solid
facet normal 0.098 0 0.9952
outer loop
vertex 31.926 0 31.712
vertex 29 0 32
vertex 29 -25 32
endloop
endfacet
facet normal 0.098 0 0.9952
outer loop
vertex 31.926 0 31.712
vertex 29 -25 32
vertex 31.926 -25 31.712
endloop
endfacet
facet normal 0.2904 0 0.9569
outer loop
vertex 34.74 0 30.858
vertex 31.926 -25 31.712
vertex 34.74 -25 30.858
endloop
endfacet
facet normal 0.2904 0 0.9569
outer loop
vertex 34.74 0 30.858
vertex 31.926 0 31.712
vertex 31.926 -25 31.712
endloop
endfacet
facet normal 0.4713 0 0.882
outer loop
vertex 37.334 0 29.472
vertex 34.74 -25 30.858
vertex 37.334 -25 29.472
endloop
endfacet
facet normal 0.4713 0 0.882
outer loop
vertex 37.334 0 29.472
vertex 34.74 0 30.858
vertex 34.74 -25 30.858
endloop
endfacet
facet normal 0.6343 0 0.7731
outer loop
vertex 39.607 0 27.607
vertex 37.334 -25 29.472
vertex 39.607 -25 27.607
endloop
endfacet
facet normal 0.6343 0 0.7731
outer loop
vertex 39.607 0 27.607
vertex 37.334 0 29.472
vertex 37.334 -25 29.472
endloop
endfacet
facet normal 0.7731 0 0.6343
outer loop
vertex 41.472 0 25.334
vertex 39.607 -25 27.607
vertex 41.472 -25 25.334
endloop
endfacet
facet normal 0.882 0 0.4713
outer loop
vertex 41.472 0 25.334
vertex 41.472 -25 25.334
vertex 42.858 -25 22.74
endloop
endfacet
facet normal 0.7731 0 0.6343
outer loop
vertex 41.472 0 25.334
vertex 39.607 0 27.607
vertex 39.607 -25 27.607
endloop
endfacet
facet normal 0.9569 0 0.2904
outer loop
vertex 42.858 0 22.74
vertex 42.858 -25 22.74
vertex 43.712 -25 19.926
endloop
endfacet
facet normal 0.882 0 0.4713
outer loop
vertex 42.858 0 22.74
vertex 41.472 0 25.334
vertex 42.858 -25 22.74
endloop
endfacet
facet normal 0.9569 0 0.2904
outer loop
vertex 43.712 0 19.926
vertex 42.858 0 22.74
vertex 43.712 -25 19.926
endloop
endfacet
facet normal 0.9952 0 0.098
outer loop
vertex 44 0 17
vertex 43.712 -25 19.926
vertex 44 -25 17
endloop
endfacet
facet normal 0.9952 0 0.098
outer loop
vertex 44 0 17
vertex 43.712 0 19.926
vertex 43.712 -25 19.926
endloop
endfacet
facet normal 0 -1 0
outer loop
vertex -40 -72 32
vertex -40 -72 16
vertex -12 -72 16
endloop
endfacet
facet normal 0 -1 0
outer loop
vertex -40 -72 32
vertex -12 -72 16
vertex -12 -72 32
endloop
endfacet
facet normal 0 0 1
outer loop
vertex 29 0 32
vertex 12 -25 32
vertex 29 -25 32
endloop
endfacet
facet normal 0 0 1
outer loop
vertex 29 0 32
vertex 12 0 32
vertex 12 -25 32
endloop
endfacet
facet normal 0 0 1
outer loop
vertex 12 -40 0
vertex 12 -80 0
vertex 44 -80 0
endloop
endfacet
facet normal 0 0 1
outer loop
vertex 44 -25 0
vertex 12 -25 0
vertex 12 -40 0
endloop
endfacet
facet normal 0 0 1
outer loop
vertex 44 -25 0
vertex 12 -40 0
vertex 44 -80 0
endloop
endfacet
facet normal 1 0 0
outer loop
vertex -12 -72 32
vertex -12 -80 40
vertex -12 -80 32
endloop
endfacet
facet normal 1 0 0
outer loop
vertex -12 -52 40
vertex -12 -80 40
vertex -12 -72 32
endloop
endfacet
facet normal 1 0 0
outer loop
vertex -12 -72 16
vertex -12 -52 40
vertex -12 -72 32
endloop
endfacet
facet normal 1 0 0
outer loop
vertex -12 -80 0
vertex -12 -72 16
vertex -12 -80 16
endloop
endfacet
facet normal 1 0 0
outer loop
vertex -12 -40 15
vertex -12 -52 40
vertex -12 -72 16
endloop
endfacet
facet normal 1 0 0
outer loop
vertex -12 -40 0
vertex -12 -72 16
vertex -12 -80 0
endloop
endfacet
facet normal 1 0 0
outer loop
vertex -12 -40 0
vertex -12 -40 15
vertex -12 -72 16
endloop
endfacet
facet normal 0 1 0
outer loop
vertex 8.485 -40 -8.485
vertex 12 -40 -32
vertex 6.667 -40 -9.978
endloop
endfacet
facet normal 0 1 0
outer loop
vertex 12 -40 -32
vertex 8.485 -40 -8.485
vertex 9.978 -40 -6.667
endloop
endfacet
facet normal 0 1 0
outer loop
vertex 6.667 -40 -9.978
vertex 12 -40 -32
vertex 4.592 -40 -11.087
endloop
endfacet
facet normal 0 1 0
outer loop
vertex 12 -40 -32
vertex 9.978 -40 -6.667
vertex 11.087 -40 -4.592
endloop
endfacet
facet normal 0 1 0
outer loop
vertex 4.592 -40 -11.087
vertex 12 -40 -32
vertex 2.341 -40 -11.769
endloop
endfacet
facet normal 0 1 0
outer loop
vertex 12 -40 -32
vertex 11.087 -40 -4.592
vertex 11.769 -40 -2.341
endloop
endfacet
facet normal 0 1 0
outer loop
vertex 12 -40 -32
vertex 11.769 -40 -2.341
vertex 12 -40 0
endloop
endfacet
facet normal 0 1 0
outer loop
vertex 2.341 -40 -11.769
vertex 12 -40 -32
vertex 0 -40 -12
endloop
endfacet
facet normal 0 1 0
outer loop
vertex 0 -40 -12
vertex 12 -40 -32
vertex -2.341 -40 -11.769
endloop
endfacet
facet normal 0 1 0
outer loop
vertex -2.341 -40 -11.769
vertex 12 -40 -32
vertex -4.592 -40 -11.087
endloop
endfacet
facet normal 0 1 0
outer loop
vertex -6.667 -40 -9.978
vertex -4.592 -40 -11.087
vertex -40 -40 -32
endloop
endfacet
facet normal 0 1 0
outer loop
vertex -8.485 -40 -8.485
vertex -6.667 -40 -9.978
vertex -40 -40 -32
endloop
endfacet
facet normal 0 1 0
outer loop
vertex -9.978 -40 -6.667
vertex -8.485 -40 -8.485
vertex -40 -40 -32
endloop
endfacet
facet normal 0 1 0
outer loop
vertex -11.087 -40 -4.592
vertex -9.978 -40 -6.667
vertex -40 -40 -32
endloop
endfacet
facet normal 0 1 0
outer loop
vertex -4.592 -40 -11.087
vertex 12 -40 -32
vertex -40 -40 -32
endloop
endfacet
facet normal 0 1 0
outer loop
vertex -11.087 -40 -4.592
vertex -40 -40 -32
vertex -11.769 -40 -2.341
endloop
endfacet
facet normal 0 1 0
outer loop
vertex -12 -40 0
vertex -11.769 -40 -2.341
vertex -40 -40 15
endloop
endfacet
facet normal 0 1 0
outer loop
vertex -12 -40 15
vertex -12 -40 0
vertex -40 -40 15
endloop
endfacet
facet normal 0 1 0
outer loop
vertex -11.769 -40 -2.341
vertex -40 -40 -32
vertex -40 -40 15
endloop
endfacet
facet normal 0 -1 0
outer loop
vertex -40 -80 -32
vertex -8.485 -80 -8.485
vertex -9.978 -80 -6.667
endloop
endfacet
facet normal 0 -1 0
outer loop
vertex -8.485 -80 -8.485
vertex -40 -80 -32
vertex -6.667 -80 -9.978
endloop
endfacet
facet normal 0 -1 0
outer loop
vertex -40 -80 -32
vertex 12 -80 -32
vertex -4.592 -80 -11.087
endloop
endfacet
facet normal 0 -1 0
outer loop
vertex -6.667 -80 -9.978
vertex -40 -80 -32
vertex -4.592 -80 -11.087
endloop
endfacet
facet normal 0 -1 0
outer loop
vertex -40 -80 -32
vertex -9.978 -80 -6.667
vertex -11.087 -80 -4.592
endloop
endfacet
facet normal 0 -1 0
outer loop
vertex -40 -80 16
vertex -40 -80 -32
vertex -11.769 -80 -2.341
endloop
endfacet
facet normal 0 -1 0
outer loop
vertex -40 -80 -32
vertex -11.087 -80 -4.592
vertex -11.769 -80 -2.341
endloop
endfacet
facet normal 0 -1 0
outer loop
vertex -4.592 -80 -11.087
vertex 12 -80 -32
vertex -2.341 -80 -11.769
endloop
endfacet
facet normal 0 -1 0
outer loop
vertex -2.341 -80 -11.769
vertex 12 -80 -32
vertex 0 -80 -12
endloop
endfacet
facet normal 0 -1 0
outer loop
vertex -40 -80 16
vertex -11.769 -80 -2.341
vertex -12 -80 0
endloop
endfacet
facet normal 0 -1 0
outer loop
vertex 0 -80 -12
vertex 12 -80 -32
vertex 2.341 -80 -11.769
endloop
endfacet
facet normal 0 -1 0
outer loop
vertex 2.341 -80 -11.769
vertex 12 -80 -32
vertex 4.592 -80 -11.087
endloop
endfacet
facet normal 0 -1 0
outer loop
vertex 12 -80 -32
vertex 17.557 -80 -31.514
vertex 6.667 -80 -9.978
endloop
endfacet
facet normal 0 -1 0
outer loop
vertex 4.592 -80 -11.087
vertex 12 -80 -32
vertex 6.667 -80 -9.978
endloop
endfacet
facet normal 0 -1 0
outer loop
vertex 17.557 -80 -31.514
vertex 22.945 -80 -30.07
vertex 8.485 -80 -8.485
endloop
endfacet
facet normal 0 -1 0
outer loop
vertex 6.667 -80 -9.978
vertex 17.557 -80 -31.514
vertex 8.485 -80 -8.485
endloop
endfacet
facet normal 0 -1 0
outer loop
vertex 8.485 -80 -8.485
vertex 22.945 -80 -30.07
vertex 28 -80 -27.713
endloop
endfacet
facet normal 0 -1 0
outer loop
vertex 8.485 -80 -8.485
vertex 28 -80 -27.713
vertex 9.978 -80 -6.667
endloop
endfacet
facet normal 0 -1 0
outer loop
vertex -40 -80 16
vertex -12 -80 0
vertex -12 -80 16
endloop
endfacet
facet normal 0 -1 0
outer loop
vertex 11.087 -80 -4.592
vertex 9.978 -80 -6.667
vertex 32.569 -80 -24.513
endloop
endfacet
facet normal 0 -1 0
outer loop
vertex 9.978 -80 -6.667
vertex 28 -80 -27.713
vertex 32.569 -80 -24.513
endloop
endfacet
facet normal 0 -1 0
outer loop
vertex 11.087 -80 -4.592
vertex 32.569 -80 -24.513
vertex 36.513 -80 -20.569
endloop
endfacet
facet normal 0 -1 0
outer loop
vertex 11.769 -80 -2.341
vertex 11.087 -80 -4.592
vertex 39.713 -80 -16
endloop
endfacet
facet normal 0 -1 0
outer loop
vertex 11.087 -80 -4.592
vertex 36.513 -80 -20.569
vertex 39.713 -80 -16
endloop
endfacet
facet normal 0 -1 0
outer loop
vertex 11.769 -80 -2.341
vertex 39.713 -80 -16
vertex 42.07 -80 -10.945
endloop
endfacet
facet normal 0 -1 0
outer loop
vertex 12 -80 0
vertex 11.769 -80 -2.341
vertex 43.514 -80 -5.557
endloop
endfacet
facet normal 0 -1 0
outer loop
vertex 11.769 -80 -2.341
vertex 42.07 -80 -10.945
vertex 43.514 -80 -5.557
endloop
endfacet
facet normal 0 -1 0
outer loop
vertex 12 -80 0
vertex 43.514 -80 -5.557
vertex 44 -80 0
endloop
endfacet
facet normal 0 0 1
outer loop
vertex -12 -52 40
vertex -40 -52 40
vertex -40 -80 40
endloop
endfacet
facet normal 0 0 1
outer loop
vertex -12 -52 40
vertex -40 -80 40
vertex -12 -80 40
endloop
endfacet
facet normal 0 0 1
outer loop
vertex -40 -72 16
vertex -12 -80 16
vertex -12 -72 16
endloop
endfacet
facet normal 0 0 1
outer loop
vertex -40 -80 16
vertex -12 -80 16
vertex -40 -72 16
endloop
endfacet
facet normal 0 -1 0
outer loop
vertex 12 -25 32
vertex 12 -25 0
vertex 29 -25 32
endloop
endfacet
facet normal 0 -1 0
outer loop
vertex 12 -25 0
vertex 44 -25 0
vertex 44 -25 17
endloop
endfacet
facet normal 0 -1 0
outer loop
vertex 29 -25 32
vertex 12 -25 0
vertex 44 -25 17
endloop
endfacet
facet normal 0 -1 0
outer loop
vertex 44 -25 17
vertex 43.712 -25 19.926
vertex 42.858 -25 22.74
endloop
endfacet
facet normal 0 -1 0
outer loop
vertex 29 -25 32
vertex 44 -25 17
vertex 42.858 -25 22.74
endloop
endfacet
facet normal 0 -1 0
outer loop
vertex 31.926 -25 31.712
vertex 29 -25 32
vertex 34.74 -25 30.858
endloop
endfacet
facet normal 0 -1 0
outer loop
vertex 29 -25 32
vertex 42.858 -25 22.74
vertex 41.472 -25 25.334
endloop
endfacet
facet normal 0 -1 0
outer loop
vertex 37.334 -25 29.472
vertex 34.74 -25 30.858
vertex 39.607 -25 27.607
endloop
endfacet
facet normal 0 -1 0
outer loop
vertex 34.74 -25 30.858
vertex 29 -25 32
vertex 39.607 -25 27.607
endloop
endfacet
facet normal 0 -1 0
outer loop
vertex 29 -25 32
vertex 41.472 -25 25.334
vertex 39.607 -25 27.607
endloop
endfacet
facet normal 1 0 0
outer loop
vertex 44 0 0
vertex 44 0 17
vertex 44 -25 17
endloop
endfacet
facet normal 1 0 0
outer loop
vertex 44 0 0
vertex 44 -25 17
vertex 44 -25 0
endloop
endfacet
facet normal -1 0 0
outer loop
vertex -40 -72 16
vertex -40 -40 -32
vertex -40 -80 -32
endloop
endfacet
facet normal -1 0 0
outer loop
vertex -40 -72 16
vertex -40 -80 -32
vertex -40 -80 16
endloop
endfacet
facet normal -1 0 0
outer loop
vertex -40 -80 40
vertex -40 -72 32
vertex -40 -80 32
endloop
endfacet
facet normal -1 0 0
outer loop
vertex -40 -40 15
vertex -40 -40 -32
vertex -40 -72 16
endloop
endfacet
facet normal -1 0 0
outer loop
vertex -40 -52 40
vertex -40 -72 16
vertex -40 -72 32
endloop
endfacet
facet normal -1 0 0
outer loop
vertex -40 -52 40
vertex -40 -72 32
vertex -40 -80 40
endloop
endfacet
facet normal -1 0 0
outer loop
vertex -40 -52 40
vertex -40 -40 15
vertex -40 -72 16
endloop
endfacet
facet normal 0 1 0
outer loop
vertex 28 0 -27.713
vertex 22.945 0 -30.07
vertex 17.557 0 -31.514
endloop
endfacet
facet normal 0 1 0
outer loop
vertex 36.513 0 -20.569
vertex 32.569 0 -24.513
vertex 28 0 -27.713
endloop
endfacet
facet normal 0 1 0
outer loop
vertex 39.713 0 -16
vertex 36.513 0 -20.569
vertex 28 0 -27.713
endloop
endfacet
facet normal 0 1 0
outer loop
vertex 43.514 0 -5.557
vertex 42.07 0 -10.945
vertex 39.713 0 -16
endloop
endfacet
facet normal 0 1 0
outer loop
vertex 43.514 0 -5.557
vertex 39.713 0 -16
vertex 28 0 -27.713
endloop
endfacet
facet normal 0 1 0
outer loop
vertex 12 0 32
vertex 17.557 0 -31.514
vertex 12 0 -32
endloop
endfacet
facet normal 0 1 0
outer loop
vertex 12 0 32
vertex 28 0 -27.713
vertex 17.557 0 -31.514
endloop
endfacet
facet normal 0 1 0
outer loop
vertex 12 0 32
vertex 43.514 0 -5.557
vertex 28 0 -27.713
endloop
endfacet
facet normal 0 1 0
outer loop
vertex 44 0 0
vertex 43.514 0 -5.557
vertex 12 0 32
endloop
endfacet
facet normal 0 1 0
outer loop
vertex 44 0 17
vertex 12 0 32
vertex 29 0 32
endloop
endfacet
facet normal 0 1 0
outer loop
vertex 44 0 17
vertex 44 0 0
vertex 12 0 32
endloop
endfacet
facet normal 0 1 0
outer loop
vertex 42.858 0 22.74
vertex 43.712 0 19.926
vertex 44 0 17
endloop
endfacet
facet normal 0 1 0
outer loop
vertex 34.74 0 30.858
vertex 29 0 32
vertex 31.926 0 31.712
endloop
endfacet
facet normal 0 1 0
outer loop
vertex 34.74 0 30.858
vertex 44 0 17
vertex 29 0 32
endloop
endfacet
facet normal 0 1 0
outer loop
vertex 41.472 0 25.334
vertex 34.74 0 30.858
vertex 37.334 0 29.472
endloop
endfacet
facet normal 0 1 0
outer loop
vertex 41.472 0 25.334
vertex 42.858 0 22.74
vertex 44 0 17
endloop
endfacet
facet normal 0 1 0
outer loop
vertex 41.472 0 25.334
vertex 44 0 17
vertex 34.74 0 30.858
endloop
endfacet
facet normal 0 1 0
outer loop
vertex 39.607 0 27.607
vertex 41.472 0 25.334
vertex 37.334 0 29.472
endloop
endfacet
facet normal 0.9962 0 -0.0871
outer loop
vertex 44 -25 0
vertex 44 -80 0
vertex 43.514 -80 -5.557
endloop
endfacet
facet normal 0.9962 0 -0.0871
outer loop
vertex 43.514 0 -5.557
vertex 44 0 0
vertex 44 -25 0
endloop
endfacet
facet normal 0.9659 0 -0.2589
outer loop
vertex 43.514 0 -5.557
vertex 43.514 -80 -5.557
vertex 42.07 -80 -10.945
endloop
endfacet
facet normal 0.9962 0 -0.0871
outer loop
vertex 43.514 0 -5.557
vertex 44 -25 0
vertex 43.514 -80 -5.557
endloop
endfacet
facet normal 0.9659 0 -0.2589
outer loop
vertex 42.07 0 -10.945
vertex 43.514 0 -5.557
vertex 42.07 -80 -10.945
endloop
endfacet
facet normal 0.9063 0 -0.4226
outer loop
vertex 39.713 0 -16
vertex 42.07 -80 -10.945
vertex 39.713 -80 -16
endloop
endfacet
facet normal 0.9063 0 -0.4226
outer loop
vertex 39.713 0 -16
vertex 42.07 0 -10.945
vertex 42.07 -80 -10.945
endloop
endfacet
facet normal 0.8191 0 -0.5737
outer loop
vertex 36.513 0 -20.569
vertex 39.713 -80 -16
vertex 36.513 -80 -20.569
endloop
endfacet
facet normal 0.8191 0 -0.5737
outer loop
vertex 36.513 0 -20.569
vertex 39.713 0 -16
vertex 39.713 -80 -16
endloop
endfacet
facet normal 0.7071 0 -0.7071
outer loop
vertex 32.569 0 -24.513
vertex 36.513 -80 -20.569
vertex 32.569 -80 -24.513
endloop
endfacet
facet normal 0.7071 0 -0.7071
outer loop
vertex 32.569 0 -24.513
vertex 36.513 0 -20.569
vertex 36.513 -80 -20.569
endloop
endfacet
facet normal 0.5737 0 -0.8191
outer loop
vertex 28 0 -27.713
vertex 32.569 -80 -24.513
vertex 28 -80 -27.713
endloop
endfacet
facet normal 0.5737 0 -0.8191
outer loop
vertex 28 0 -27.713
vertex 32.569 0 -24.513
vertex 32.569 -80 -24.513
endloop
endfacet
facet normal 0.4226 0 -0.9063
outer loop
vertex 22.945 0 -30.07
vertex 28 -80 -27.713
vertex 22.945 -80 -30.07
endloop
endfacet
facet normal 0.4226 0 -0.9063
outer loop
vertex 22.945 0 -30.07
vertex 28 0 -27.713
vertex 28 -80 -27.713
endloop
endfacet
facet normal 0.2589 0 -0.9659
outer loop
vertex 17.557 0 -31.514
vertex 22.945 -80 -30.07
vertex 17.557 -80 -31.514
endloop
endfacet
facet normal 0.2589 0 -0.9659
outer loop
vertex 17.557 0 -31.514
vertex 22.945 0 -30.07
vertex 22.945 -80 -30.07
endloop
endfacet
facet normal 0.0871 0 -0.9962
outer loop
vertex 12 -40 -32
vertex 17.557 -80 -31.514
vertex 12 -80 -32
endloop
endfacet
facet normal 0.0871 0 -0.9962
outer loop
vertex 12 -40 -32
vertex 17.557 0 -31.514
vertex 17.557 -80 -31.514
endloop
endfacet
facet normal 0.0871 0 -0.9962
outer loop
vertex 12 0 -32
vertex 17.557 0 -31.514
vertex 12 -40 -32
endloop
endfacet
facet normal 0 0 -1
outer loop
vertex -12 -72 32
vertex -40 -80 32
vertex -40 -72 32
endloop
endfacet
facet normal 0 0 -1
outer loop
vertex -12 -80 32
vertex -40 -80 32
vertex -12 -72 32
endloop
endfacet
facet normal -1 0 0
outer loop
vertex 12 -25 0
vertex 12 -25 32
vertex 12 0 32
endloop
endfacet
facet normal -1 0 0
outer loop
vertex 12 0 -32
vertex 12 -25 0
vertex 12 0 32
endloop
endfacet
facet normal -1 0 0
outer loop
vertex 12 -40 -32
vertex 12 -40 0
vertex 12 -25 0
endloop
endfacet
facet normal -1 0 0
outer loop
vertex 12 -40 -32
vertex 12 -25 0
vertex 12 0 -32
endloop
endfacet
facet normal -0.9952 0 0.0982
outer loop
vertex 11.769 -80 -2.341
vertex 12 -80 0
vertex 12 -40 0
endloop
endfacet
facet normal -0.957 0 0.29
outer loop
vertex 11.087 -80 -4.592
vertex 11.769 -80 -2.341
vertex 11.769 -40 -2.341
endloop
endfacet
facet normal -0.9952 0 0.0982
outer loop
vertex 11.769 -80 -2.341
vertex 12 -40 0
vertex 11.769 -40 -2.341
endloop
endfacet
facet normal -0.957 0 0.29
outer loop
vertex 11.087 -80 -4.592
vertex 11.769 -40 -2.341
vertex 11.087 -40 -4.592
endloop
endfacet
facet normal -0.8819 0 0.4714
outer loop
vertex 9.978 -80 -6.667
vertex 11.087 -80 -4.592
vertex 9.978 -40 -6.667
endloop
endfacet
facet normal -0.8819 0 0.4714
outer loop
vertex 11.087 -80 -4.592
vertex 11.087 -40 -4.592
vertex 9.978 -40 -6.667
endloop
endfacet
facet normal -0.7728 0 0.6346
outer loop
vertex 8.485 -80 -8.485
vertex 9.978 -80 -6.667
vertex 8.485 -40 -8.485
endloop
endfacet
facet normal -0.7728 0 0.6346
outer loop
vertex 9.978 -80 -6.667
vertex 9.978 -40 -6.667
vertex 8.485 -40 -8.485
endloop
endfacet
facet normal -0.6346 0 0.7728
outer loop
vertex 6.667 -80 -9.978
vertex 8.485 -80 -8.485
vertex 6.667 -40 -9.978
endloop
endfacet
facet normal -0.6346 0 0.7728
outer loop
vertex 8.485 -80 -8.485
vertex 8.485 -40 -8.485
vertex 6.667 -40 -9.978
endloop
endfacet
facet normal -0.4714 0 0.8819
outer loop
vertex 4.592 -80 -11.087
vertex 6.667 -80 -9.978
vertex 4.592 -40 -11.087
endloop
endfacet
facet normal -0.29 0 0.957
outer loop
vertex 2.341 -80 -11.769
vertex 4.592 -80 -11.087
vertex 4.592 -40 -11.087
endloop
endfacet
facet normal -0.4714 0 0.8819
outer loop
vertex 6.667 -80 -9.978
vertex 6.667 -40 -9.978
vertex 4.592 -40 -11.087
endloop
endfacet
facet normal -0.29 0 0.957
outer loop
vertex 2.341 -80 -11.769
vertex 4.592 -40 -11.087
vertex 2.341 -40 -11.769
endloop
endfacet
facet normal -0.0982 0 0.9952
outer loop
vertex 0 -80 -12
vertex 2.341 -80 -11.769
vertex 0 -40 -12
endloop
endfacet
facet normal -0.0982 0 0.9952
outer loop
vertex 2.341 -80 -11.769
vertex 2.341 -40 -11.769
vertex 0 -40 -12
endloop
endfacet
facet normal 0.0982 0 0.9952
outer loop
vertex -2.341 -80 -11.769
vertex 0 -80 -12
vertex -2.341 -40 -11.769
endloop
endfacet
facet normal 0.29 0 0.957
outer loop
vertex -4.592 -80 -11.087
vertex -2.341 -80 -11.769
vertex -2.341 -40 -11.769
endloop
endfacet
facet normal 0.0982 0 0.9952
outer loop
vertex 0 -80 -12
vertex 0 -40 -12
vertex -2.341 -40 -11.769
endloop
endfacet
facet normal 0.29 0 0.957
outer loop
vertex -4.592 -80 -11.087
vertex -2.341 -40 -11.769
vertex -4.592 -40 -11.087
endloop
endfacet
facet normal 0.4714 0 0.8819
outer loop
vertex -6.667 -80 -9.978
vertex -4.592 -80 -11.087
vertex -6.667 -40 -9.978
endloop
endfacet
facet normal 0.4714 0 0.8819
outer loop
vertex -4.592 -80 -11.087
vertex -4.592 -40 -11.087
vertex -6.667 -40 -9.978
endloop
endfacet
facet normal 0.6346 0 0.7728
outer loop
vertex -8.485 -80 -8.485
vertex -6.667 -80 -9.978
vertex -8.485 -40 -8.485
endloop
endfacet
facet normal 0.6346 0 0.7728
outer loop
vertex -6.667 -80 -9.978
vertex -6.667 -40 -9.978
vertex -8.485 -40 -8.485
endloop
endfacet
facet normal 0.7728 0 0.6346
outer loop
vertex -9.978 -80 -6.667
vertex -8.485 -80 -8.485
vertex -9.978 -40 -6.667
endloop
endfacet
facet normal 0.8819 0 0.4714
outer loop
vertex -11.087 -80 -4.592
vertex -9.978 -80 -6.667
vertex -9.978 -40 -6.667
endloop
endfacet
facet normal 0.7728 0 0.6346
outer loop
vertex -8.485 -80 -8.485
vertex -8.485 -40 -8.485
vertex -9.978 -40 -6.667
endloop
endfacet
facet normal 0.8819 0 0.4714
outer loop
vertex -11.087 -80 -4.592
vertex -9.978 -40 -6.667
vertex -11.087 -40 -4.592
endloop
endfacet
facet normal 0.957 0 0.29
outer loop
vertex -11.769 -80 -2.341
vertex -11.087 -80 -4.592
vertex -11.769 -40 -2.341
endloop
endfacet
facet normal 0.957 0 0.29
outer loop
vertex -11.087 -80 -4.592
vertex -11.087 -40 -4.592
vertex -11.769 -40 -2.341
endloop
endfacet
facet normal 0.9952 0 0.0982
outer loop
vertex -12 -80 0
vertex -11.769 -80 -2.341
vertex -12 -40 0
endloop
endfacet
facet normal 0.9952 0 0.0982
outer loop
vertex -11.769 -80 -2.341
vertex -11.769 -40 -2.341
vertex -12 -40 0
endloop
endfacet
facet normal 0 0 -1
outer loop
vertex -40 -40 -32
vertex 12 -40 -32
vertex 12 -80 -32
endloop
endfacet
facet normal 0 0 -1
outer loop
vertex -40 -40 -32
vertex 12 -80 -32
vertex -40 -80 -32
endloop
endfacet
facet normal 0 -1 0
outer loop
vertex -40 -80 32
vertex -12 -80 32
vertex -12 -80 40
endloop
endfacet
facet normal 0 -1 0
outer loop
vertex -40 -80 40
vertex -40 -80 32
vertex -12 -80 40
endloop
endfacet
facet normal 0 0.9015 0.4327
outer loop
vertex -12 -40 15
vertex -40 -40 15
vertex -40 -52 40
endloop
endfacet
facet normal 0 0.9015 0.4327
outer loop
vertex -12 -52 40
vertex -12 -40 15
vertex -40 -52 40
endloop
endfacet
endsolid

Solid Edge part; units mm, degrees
sketch "Sketch1" plane through (0, 0, 0) normal (0, -1, 0) x (1, 0, 0)
  line L0 (44, 17) -> (44, 0)
  line L1 (12, 0) -> (44, 0)
  line L2 (12, 0) -> (12, 32)
  line L3 (12, 32) -> (29, 32)
  arc A0 (29, 32) -> (44, 17) centre (29, 17) cw
extrude "Protrusion1" add sketch "Sketch1" along normal blind 25
sketch "Sketch2" plane through (0, 0, 0) normal (0, -1, 0) x (1, 0, 0)
  arc A0 (44, 0) -> (12, -32) centre (12, 0) cw
  line L0 (12, -32) -> (-40, -32)
  line L1 (-40, -32) -> (-40, 40)
  line L2 (-40, 40) -> (-12, 40)
  line L3 (-12, 40) -> (-12, 0)
  arc A1 (12, 0) -> (-12, 0) centre (0, 0) cw
  line L4 (12, 0) -> (44, 0)
extrude "ExtrudedProtrusion_2" add sketch "Sketch2" along normal blind 80
sketch "Sketch3" plane through (2, -80, 4) normal (0, -1, 0) x (1, 0, 0)
  line L0 (-14, 12) -> (-42, 12)
  line L1 (-42, 12) -> (-42, 28)
  line L2 (-42, 28) -> (-14, 28)
  line L3 (-14, 28) -> (-14, 12)
extrude "ExtrudedCutout_1" cut sketch "Sketch3" against normal blind 8
sketch "Sketch4" plane through (-40, -40, 4) normal (-1, 0, 0) x (0, -1, 0)
  line L0 (0, -4) -> (0, 11)
  line L1 (0, 11) -> (12, 36)
  line L2 (0, 36) -> (12, 36)
  line L3 (-40, 36) -> (0, 36)
  line L4 (-40, 36) -> (-40, -4)
  line L5 (-40, -4) -> (-40, -36)
  line L6 (-40, -36) -> (0, -36)
  line L7 (0, -36) -> (0, -4)
extrude "ExtrudedCutout_2" cut sketch "Sketch4" against normal blind 52
